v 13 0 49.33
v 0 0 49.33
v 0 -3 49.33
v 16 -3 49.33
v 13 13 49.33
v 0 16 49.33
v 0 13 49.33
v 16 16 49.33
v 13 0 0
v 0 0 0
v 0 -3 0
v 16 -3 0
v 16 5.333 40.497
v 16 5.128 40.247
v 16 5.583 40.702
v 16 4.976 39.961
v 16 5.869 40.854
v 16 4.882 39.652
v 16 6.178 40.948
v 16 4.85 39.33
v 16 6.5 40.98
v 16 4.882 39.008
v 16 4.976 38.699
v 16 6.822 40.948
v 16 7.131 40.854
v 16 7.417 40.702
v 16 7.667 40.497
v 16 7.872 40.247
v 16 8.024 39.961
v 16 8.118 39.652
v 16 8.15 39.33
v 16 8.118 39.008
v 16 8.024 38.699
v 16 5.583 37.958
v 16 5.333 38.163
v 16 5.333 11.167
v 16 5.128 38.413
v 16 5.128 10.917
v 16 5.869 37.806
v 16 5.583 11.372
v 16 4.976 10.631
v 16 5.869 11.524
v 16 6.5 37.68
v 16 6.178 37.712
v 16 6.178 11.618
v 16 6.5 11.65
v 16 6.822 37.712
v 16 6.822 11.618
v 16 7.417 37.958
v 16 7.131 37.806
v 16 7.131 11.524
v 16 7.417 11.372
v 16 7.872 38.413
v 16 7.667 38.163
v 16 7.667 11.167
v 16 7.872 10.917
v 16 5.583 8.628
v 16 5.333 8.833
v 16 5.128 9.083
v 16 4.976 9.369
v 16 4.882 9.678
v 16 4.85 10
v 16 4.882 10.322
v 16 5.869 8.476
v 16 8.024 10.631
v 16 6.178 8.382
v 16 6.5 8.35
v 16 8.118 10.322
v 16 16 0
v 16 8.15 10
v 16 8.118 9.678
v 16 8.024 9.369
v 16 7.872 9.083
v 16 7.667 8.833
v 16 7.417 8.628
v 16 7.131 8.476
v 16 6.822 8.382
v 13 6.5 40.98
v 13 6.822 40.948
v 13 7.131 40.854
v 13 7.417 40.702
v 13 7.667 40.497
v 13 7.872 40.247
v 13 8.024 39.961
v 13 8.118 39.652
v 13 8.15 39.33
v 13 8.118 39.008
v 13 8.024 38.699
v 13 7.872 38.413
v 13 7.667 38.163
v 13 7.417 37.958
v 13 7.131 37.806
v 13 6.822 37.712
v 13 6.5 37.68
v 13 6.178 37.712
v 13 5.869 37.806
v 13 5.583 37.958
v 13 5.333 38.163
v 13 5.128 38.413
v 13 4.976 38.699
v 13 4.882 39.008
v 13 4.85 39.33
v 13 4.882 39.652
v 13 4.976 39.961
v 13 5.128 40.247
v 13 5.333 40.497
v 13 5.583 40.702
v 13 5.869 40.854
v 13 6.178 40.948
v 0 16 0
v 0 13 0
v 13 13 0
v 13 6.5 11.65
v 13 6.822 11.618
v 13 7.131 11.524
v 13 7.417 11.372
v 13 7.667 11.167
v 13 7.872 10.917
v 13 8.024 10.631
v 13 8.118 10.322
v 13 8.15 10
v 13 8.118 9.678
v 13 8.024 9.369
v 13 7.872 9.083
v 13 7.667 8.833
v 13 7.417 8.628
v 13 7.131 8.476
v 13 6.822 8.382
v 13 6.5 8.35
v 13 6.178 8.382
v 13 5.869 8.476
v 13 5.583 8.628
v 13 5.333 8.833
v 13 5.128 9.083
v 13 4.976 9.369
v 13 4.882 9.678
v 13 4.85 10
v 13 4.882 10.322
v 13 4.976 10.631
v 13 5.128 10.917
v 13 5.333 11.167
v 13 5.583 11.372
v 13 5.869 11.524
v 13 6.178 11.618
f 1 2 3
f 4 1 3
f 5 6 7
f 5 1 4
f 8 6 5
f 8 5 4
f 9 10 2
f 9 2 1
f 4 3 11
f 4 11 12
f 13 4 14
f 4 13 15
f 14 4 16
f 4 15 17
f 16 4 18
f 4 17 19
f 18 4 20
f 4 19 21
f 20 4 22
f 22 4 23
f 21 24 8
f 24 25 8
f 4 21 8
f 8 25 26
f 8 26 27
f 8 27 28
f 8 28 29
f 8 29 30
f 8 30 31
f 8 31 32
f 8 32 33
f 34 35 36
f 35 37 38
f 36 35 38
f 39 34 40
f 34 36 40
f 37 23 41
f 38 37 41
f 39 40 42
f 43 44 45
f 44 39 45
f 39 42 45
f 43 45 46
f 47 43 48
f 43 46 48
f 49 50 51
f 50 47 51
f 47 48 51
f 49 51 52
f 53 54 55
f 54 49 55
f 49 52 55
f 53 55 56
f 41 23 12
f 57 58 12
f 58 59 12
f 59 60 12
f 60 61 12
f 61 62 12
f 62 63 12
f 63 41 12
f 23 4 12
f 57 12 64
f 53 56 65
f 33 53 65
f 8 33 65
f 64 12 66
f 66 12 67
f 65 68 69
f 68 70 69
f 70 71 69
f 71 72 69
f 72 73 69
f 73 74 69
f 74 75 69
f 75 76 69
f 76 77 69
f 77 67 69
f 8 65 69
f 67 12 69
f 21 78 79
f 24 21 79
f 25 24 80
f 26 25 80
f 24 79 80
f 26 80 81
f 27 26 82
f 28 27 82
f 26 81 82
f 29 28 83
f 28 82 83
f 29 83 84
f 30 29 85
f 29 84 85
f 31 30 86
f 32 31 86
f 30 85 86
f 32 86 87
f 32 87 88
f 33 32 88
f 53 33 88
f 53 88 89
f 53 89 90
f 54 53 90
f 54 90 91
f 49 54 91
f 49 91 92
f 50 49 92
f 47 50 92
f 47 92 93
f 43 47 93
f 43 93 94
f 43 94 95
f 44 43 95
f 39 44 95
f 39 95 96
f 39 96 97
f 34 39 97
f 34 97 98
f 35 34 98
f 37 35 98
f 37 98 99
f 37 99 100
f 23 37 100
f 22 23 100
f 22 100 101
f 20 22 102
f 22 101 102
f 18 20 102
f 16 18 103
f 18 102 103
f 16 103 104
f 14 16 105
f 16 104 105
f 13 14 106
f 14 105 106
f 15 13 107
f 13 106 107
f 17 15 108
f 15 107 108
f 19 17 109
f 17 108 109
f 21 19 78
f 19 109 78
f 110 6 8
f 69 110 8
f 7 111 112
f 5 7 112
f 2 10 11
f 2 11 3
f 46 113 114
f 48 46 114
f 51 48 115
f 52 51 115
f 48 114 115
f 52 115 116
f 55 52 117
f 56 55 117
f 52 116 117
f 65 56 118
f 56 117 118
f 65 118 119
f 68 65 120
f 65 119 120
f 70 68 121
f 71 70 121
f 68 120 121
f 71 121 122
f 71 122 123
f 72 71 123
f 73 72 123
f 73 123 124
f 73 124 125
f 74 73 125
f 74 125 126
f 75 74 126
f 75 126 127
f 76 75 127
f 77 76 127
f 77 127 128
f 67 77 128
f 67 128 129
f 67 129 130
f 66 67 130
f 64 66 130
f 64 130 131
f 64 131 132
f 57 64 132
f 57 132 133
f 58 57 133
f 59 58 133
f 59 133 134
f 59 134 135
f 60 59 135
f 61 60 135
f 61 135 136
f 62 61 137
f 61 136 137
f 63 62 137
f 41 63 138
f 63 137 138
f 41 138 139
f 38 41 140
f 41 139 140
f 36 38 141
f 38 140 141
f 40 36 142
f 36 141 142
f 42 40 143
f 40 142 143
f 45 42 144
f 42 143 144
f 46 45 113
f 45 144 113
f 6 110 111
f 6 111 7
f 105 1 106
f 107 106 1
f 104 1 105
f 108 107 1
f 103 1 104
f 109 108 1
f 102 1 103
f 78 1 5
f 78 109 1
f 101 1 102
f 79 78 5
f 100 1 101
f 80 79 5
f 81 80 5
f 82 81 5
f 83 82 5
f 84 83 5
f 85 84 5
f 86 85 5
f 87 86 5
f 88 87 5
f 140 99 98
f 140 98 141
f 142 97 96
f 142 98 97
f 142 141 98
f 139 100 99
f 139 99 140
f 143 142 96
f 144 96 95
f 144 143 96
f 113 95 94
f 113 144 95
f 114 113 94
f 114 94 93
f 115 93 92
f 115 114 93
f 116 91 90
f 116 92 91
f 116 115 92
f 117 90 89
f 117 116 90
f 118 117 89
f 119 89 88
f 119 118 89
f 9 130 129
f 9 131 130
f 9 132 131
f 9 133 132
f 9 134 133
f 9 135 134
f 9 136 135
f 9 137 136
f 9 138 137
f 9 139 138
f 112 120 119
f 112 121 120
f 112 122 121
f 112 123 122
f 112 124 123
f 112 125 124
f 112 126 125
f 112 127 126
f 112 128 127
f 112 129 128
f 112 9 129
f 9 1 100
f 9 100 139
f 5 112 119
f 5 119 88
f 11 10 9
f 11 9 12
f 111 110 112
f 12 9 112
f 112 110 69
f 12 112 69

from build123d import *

# Parameters (mm, degrees)
SKETCH_1_W          = 19
SKETCH_1_H          = 19
SKETCH_1_W_2        = 13
SKETCH_1_H_2        = 13
EXTRUDE_1_DEPTH     = 49.33
SKETCH_2_R          = 1.65
CUT_EXTRUDE_1_DEPTH = 30
SKETCH_3_W          = 116.915177823
SKETCH_3_H          = 46.219516436
CUT_EXTRUDE_2_DEPTH = 3


with BuildPart() as part:
    # 草图1 → Extrude 1 (new body)
    with BuildSketch(Plane.XY):
        with Locations((6.5, 6.5)):
            Rectangle(SKETCH_1_W, SKETCH_1_H)
        with Locations((6.5, 6.5)):
            Rectangle(SKETCH_1_W_2, SKETCH_1_H_2, mode=Mode.SUBTRACT)
    extrude(amount=EXTRUDE_1_DEPTH)

    # 草图2 → 切除-拉伸1 (cut)
    with BuildSketch(Plane.ZY.offset(3)):
        with Locations((10, 6.5)):
            Circle(SKETCH_2_R)
        with Locations((39.33, 6.5)):
            Circle(SKETCH_2_R)
    extrude(amount=-CUT_EXTRUDE_1_DEPTH, mode=Mode.SUBTRACT)

    # 草图3 → 切除-拉伸2 (cut)
    with BuildSketch(Plane.ZY.offset(3)):
        with Locations((53.162237228, 0.202739406)):
            Rectangle(SKETCH_3_W, SKETCH_3_H)
    extrude(amount=-CUT_EXTRUDE_2_DEPTH, mode=Mode.SUBTRACT)


solid = part.part
